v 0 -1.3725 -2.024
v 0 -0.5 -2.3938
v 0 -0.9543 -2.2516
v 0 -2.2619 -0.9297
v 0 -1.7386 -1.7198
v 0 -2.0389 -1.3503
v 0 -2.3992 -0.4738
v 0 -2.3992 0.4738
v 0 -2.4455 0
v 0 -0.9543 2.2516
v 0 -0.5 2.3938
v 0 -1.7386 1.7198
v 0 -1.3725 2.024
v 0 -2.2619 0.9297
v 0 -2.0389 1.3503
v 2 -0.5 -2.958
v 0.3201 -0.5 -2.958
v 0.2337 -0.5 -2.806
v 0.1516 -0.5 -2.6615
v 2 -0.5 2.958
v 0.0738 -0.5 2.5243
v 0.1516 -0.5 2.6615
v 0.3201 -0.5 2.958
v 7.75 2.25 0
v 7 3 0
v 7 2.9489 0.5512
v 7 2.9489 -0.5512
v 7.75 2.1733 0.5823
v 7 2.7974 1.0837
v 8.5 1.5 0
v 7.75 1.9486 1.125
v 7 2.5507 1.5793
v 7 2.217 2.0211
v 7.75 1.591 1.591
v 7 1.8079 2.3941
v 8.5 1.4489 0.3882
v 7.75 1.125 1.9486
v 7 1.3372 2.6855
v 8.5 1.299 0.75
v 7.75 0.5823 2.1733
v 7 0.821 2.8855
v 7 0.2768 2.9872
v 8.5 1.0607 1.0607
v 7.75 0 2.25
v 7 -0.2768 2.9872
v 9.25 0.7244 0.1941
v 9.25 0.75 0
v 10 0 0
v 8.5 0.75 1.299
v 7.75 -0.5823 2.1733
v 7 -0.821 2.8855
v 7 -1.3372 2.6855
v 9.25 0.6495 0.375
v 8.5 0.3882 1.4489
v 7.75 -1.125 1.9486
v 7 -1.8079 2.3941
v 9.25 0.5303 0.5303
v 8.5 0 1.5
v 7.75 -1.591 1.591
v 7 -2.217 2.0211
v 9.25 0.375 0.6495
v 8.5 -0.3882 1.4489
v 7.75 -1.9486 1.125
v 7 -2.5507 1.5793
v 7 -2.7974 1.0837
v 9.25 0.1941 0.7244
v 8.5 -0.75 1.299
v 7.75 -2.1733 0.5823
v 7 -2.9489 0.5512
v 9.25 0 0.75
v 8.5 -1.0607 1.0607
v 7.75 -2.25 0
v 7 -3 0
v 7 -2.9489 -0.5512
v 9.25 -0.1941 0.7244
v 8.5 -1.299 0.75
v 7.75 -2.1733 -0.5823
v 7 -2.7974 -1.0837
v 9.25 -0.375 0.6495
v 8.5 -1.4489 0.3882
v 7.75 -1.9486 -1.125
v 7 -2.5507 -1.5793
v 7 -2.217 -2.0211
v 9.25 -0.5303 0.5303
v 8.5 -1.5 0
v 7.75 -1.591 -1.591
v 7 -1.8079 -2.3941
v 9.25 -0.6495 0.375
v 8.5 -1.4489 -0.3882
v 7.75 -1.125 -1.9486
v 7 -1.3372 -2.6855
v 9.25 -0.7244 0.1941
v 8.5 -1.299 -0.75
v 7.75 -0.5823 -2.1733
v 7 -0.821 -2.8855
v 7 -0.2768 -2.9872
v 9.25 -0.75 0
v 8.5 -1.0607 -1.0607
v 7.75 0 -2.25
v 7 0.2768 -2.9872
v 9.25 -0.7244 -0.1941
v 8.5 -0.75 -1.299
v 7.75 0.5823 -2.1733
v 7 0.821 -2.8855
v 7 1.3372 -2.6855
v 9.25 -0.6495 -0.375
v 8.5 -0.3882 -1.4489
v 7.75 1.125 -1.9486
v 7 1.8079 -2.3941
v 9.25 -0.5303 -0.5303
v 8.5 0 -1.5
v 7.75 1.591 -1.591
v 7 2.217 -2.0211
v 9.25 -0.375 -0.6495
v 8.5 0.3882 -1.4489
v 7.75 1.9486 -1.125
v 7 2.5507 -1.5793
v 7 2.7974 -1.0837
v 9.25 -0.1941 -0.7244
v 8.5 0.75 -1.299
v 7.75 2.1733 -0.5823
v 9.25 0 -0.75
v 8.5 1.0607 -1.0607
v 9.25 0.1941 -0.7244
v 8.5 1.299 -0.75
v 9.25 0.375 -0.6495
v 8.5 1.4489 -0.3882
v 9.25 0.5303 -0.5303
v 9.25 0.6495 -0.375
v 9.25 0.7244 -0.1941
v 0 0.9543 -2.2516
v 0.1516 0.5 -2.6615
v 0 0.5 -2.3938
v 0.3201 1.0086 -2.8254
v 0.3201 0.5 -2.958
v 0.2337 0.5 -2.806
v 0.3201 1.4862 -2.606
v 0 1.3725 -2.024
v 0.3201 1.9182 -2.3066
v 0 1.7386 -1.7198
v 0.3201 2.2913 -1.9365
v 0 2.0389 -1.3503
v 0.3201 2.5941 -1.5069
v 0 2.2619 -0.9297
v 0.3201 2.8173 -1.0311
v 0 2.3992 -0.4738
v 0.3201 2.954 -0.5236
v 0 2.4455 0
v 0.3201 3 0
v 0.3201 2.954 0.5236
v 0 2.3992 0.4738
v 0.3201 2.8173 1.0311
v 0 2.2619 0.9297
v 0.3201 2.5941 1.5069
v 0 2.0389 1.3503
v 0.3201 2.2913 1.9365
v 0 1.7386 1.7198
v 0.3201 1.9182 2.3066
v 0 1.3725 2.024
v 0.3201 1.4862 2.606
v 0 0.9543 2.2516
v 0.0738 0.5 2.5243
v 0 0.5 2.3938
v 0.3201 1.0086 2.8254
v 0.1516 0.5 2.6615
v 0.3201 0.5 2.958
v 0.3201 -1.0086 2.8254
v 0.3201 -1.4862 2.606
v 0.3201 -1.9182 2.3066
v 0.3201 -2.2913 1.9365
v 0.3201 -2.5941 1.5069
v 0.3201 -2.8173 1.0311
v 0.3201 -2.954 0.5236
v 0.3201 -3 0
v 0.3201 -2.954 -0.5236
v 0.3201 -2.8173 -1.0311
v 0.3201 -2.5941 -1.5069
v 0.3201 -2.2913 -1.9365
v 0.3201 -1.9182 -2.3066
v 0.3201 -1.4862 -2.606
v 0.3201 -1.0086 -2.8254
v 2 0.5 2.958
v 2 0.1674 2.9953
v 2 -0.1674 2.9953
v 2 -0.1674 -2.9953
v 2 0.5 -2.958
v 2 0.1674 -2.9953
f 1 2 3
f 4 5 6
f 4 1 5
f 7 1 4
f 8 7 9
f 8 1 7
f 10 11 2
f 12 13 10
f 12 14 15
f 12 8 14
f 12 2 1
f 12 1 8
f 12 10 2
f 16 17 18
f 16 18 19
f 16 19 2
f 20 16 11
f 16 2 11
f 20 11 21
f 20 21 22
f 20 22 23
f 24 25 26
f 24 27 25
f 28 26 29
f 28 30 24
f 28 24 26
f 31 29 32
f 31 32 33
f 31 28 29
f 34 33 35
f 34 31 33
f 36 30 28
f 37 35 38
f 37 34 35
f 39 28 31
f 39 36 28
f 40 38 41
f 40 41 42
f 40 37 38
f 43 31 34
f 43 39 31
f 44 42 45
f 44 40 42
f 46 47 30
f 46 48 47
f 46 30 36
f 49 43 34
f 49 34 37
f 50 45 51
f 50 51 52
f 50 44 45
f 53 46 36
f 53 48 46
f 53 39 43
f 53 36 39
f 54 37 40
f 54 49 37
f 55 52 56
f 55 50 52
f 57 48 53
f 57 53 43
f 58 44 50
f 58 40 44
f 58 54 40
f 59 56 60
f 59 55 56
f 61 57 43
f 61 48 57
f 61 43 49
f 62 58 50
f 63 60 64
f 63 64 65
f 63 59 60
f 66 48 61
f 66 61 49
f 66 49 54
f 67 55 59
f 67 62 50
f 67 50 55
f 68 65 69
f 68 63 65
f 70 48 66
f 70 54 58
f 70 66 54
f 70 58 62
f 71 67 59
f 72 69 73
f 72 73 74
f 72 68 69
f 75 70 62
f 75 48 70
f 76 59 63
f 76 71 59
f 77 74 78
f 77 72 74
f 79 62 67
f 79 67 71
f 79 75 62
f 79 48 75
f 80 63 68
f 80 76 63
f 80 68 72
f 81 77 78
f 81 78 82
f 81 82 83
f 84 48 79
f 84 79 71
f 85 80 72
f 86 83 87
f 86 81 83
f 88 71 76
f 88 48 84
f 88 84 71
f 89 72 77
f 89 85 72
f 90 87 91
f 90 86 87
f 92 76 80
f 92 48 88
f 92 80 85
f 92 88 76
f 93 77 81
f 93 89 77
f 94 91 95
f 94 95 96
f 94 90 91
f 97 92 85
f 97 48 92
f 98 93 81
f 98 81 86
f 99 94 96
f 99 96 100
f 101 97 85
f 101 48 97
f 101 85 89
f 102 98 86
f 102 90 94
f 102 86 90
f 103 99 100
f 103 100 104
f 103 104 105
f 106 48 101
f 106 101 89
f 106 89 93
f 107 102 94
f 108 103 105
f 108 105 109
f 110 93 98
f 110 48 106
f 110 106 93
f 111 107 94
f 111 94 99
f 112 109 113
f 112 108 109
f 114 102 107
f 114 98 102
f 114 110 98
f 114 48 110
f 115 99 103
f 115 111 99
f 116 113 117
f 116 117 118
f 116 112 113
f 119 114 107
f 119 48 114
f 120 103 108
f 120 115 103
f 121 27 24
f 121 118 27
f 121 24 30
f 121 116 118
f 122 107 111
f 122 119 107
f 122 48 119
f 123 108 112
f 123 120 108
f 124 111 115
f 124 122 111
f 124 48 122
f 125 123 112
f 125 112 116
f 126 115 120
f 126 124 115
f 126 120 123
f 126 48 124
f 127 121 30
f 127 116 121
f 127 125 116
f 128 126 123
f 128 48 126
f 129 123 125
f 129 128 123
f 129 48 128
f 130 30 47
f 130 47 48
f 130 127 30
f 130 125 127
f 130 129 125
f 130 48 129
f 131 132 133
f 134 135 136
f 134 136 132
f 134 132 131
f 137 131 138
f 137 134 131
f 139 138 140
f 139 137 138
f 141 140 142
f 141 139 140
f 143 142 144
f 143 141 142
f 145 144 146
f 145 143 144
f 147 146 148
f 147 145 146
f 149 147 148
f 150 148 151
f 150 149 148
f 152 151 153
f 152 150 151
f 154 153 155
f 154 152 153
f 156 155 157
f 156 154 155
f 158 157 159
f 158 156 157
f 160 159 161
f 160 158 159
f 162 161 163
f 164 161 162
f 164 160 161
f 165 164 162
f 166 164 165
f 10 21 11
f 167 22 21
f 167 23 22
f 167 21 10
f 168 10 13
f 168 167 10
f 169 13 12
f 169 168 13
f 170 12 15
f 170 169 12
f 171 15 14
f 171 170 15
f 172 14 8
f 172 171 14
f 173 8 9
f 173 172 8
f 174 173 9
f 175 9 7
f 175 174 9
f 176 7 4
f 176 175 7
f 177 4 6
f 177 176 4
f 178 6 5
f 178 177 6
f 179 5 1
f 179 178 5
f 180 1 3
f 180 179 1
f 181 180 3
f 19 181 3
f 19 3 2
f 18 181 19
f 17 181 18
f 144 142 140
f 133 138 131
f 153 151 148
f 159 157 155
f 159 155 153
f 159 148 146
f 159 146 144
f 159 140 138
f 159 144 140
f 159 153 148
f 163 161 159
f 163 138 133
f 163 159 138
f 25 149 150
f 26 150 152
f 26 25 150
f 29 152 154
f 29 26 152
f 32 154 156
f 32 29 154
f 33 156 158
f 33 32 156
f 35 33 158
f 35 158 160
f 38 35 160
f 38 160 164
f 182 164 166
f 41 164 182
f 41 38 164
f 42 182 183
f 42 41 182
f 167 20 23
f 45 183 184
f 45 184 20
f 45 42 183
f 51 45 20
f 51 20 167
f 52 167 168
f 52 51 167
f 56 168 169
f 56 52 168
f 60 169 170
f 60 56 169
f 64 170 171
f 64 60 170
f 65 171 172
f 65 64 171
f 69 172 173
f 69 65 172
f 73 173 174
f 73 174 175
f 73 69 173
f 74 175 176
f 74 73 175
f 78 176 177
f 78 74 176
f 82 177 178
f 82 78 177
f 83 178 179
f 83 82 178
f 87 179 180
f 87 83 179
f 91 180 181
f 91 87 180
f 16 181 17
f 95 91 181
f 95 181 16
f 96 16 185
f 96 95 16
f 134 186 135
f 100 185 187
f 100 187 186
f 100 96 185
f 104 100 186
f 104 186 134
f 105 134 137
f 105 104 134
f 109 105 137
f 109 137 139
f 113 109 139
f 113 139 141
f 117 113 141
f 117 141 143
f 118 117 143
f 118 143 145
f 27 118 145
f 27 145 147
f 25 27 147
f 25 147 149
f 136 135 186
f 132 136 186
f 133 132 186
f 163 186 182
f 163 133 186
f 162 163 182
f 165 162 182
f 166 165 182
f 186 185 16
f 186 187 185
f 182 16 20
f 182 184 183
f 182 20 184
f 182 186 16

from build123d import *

# Parameters (mm, degrees)
SKETCH2_W  = 6
SKETCH2_H  = 1
SLOT_DEPTH = 2


with BuildPart() as part:
    # BodySke → BaseBody (revolve)
    with BuildSketch(Plane.XY):
        Polygon((0, 0), (0, 2.4455), (0.320140724, 3), (7, 3), (10, 0), align=None)
    revolve(axis=Axis((-12.7, 0, 0), (1, 0, 0)))

    # Sketch2 → Slot (cut)
    with BuildSketch(Plane.ZY):
        Rectangle(SKETCH2_W, SKETCH2_H)
    extrude(amount=-SLOT_DEPTH, mode=Mode.SUBTRACT)


solid = part.part
